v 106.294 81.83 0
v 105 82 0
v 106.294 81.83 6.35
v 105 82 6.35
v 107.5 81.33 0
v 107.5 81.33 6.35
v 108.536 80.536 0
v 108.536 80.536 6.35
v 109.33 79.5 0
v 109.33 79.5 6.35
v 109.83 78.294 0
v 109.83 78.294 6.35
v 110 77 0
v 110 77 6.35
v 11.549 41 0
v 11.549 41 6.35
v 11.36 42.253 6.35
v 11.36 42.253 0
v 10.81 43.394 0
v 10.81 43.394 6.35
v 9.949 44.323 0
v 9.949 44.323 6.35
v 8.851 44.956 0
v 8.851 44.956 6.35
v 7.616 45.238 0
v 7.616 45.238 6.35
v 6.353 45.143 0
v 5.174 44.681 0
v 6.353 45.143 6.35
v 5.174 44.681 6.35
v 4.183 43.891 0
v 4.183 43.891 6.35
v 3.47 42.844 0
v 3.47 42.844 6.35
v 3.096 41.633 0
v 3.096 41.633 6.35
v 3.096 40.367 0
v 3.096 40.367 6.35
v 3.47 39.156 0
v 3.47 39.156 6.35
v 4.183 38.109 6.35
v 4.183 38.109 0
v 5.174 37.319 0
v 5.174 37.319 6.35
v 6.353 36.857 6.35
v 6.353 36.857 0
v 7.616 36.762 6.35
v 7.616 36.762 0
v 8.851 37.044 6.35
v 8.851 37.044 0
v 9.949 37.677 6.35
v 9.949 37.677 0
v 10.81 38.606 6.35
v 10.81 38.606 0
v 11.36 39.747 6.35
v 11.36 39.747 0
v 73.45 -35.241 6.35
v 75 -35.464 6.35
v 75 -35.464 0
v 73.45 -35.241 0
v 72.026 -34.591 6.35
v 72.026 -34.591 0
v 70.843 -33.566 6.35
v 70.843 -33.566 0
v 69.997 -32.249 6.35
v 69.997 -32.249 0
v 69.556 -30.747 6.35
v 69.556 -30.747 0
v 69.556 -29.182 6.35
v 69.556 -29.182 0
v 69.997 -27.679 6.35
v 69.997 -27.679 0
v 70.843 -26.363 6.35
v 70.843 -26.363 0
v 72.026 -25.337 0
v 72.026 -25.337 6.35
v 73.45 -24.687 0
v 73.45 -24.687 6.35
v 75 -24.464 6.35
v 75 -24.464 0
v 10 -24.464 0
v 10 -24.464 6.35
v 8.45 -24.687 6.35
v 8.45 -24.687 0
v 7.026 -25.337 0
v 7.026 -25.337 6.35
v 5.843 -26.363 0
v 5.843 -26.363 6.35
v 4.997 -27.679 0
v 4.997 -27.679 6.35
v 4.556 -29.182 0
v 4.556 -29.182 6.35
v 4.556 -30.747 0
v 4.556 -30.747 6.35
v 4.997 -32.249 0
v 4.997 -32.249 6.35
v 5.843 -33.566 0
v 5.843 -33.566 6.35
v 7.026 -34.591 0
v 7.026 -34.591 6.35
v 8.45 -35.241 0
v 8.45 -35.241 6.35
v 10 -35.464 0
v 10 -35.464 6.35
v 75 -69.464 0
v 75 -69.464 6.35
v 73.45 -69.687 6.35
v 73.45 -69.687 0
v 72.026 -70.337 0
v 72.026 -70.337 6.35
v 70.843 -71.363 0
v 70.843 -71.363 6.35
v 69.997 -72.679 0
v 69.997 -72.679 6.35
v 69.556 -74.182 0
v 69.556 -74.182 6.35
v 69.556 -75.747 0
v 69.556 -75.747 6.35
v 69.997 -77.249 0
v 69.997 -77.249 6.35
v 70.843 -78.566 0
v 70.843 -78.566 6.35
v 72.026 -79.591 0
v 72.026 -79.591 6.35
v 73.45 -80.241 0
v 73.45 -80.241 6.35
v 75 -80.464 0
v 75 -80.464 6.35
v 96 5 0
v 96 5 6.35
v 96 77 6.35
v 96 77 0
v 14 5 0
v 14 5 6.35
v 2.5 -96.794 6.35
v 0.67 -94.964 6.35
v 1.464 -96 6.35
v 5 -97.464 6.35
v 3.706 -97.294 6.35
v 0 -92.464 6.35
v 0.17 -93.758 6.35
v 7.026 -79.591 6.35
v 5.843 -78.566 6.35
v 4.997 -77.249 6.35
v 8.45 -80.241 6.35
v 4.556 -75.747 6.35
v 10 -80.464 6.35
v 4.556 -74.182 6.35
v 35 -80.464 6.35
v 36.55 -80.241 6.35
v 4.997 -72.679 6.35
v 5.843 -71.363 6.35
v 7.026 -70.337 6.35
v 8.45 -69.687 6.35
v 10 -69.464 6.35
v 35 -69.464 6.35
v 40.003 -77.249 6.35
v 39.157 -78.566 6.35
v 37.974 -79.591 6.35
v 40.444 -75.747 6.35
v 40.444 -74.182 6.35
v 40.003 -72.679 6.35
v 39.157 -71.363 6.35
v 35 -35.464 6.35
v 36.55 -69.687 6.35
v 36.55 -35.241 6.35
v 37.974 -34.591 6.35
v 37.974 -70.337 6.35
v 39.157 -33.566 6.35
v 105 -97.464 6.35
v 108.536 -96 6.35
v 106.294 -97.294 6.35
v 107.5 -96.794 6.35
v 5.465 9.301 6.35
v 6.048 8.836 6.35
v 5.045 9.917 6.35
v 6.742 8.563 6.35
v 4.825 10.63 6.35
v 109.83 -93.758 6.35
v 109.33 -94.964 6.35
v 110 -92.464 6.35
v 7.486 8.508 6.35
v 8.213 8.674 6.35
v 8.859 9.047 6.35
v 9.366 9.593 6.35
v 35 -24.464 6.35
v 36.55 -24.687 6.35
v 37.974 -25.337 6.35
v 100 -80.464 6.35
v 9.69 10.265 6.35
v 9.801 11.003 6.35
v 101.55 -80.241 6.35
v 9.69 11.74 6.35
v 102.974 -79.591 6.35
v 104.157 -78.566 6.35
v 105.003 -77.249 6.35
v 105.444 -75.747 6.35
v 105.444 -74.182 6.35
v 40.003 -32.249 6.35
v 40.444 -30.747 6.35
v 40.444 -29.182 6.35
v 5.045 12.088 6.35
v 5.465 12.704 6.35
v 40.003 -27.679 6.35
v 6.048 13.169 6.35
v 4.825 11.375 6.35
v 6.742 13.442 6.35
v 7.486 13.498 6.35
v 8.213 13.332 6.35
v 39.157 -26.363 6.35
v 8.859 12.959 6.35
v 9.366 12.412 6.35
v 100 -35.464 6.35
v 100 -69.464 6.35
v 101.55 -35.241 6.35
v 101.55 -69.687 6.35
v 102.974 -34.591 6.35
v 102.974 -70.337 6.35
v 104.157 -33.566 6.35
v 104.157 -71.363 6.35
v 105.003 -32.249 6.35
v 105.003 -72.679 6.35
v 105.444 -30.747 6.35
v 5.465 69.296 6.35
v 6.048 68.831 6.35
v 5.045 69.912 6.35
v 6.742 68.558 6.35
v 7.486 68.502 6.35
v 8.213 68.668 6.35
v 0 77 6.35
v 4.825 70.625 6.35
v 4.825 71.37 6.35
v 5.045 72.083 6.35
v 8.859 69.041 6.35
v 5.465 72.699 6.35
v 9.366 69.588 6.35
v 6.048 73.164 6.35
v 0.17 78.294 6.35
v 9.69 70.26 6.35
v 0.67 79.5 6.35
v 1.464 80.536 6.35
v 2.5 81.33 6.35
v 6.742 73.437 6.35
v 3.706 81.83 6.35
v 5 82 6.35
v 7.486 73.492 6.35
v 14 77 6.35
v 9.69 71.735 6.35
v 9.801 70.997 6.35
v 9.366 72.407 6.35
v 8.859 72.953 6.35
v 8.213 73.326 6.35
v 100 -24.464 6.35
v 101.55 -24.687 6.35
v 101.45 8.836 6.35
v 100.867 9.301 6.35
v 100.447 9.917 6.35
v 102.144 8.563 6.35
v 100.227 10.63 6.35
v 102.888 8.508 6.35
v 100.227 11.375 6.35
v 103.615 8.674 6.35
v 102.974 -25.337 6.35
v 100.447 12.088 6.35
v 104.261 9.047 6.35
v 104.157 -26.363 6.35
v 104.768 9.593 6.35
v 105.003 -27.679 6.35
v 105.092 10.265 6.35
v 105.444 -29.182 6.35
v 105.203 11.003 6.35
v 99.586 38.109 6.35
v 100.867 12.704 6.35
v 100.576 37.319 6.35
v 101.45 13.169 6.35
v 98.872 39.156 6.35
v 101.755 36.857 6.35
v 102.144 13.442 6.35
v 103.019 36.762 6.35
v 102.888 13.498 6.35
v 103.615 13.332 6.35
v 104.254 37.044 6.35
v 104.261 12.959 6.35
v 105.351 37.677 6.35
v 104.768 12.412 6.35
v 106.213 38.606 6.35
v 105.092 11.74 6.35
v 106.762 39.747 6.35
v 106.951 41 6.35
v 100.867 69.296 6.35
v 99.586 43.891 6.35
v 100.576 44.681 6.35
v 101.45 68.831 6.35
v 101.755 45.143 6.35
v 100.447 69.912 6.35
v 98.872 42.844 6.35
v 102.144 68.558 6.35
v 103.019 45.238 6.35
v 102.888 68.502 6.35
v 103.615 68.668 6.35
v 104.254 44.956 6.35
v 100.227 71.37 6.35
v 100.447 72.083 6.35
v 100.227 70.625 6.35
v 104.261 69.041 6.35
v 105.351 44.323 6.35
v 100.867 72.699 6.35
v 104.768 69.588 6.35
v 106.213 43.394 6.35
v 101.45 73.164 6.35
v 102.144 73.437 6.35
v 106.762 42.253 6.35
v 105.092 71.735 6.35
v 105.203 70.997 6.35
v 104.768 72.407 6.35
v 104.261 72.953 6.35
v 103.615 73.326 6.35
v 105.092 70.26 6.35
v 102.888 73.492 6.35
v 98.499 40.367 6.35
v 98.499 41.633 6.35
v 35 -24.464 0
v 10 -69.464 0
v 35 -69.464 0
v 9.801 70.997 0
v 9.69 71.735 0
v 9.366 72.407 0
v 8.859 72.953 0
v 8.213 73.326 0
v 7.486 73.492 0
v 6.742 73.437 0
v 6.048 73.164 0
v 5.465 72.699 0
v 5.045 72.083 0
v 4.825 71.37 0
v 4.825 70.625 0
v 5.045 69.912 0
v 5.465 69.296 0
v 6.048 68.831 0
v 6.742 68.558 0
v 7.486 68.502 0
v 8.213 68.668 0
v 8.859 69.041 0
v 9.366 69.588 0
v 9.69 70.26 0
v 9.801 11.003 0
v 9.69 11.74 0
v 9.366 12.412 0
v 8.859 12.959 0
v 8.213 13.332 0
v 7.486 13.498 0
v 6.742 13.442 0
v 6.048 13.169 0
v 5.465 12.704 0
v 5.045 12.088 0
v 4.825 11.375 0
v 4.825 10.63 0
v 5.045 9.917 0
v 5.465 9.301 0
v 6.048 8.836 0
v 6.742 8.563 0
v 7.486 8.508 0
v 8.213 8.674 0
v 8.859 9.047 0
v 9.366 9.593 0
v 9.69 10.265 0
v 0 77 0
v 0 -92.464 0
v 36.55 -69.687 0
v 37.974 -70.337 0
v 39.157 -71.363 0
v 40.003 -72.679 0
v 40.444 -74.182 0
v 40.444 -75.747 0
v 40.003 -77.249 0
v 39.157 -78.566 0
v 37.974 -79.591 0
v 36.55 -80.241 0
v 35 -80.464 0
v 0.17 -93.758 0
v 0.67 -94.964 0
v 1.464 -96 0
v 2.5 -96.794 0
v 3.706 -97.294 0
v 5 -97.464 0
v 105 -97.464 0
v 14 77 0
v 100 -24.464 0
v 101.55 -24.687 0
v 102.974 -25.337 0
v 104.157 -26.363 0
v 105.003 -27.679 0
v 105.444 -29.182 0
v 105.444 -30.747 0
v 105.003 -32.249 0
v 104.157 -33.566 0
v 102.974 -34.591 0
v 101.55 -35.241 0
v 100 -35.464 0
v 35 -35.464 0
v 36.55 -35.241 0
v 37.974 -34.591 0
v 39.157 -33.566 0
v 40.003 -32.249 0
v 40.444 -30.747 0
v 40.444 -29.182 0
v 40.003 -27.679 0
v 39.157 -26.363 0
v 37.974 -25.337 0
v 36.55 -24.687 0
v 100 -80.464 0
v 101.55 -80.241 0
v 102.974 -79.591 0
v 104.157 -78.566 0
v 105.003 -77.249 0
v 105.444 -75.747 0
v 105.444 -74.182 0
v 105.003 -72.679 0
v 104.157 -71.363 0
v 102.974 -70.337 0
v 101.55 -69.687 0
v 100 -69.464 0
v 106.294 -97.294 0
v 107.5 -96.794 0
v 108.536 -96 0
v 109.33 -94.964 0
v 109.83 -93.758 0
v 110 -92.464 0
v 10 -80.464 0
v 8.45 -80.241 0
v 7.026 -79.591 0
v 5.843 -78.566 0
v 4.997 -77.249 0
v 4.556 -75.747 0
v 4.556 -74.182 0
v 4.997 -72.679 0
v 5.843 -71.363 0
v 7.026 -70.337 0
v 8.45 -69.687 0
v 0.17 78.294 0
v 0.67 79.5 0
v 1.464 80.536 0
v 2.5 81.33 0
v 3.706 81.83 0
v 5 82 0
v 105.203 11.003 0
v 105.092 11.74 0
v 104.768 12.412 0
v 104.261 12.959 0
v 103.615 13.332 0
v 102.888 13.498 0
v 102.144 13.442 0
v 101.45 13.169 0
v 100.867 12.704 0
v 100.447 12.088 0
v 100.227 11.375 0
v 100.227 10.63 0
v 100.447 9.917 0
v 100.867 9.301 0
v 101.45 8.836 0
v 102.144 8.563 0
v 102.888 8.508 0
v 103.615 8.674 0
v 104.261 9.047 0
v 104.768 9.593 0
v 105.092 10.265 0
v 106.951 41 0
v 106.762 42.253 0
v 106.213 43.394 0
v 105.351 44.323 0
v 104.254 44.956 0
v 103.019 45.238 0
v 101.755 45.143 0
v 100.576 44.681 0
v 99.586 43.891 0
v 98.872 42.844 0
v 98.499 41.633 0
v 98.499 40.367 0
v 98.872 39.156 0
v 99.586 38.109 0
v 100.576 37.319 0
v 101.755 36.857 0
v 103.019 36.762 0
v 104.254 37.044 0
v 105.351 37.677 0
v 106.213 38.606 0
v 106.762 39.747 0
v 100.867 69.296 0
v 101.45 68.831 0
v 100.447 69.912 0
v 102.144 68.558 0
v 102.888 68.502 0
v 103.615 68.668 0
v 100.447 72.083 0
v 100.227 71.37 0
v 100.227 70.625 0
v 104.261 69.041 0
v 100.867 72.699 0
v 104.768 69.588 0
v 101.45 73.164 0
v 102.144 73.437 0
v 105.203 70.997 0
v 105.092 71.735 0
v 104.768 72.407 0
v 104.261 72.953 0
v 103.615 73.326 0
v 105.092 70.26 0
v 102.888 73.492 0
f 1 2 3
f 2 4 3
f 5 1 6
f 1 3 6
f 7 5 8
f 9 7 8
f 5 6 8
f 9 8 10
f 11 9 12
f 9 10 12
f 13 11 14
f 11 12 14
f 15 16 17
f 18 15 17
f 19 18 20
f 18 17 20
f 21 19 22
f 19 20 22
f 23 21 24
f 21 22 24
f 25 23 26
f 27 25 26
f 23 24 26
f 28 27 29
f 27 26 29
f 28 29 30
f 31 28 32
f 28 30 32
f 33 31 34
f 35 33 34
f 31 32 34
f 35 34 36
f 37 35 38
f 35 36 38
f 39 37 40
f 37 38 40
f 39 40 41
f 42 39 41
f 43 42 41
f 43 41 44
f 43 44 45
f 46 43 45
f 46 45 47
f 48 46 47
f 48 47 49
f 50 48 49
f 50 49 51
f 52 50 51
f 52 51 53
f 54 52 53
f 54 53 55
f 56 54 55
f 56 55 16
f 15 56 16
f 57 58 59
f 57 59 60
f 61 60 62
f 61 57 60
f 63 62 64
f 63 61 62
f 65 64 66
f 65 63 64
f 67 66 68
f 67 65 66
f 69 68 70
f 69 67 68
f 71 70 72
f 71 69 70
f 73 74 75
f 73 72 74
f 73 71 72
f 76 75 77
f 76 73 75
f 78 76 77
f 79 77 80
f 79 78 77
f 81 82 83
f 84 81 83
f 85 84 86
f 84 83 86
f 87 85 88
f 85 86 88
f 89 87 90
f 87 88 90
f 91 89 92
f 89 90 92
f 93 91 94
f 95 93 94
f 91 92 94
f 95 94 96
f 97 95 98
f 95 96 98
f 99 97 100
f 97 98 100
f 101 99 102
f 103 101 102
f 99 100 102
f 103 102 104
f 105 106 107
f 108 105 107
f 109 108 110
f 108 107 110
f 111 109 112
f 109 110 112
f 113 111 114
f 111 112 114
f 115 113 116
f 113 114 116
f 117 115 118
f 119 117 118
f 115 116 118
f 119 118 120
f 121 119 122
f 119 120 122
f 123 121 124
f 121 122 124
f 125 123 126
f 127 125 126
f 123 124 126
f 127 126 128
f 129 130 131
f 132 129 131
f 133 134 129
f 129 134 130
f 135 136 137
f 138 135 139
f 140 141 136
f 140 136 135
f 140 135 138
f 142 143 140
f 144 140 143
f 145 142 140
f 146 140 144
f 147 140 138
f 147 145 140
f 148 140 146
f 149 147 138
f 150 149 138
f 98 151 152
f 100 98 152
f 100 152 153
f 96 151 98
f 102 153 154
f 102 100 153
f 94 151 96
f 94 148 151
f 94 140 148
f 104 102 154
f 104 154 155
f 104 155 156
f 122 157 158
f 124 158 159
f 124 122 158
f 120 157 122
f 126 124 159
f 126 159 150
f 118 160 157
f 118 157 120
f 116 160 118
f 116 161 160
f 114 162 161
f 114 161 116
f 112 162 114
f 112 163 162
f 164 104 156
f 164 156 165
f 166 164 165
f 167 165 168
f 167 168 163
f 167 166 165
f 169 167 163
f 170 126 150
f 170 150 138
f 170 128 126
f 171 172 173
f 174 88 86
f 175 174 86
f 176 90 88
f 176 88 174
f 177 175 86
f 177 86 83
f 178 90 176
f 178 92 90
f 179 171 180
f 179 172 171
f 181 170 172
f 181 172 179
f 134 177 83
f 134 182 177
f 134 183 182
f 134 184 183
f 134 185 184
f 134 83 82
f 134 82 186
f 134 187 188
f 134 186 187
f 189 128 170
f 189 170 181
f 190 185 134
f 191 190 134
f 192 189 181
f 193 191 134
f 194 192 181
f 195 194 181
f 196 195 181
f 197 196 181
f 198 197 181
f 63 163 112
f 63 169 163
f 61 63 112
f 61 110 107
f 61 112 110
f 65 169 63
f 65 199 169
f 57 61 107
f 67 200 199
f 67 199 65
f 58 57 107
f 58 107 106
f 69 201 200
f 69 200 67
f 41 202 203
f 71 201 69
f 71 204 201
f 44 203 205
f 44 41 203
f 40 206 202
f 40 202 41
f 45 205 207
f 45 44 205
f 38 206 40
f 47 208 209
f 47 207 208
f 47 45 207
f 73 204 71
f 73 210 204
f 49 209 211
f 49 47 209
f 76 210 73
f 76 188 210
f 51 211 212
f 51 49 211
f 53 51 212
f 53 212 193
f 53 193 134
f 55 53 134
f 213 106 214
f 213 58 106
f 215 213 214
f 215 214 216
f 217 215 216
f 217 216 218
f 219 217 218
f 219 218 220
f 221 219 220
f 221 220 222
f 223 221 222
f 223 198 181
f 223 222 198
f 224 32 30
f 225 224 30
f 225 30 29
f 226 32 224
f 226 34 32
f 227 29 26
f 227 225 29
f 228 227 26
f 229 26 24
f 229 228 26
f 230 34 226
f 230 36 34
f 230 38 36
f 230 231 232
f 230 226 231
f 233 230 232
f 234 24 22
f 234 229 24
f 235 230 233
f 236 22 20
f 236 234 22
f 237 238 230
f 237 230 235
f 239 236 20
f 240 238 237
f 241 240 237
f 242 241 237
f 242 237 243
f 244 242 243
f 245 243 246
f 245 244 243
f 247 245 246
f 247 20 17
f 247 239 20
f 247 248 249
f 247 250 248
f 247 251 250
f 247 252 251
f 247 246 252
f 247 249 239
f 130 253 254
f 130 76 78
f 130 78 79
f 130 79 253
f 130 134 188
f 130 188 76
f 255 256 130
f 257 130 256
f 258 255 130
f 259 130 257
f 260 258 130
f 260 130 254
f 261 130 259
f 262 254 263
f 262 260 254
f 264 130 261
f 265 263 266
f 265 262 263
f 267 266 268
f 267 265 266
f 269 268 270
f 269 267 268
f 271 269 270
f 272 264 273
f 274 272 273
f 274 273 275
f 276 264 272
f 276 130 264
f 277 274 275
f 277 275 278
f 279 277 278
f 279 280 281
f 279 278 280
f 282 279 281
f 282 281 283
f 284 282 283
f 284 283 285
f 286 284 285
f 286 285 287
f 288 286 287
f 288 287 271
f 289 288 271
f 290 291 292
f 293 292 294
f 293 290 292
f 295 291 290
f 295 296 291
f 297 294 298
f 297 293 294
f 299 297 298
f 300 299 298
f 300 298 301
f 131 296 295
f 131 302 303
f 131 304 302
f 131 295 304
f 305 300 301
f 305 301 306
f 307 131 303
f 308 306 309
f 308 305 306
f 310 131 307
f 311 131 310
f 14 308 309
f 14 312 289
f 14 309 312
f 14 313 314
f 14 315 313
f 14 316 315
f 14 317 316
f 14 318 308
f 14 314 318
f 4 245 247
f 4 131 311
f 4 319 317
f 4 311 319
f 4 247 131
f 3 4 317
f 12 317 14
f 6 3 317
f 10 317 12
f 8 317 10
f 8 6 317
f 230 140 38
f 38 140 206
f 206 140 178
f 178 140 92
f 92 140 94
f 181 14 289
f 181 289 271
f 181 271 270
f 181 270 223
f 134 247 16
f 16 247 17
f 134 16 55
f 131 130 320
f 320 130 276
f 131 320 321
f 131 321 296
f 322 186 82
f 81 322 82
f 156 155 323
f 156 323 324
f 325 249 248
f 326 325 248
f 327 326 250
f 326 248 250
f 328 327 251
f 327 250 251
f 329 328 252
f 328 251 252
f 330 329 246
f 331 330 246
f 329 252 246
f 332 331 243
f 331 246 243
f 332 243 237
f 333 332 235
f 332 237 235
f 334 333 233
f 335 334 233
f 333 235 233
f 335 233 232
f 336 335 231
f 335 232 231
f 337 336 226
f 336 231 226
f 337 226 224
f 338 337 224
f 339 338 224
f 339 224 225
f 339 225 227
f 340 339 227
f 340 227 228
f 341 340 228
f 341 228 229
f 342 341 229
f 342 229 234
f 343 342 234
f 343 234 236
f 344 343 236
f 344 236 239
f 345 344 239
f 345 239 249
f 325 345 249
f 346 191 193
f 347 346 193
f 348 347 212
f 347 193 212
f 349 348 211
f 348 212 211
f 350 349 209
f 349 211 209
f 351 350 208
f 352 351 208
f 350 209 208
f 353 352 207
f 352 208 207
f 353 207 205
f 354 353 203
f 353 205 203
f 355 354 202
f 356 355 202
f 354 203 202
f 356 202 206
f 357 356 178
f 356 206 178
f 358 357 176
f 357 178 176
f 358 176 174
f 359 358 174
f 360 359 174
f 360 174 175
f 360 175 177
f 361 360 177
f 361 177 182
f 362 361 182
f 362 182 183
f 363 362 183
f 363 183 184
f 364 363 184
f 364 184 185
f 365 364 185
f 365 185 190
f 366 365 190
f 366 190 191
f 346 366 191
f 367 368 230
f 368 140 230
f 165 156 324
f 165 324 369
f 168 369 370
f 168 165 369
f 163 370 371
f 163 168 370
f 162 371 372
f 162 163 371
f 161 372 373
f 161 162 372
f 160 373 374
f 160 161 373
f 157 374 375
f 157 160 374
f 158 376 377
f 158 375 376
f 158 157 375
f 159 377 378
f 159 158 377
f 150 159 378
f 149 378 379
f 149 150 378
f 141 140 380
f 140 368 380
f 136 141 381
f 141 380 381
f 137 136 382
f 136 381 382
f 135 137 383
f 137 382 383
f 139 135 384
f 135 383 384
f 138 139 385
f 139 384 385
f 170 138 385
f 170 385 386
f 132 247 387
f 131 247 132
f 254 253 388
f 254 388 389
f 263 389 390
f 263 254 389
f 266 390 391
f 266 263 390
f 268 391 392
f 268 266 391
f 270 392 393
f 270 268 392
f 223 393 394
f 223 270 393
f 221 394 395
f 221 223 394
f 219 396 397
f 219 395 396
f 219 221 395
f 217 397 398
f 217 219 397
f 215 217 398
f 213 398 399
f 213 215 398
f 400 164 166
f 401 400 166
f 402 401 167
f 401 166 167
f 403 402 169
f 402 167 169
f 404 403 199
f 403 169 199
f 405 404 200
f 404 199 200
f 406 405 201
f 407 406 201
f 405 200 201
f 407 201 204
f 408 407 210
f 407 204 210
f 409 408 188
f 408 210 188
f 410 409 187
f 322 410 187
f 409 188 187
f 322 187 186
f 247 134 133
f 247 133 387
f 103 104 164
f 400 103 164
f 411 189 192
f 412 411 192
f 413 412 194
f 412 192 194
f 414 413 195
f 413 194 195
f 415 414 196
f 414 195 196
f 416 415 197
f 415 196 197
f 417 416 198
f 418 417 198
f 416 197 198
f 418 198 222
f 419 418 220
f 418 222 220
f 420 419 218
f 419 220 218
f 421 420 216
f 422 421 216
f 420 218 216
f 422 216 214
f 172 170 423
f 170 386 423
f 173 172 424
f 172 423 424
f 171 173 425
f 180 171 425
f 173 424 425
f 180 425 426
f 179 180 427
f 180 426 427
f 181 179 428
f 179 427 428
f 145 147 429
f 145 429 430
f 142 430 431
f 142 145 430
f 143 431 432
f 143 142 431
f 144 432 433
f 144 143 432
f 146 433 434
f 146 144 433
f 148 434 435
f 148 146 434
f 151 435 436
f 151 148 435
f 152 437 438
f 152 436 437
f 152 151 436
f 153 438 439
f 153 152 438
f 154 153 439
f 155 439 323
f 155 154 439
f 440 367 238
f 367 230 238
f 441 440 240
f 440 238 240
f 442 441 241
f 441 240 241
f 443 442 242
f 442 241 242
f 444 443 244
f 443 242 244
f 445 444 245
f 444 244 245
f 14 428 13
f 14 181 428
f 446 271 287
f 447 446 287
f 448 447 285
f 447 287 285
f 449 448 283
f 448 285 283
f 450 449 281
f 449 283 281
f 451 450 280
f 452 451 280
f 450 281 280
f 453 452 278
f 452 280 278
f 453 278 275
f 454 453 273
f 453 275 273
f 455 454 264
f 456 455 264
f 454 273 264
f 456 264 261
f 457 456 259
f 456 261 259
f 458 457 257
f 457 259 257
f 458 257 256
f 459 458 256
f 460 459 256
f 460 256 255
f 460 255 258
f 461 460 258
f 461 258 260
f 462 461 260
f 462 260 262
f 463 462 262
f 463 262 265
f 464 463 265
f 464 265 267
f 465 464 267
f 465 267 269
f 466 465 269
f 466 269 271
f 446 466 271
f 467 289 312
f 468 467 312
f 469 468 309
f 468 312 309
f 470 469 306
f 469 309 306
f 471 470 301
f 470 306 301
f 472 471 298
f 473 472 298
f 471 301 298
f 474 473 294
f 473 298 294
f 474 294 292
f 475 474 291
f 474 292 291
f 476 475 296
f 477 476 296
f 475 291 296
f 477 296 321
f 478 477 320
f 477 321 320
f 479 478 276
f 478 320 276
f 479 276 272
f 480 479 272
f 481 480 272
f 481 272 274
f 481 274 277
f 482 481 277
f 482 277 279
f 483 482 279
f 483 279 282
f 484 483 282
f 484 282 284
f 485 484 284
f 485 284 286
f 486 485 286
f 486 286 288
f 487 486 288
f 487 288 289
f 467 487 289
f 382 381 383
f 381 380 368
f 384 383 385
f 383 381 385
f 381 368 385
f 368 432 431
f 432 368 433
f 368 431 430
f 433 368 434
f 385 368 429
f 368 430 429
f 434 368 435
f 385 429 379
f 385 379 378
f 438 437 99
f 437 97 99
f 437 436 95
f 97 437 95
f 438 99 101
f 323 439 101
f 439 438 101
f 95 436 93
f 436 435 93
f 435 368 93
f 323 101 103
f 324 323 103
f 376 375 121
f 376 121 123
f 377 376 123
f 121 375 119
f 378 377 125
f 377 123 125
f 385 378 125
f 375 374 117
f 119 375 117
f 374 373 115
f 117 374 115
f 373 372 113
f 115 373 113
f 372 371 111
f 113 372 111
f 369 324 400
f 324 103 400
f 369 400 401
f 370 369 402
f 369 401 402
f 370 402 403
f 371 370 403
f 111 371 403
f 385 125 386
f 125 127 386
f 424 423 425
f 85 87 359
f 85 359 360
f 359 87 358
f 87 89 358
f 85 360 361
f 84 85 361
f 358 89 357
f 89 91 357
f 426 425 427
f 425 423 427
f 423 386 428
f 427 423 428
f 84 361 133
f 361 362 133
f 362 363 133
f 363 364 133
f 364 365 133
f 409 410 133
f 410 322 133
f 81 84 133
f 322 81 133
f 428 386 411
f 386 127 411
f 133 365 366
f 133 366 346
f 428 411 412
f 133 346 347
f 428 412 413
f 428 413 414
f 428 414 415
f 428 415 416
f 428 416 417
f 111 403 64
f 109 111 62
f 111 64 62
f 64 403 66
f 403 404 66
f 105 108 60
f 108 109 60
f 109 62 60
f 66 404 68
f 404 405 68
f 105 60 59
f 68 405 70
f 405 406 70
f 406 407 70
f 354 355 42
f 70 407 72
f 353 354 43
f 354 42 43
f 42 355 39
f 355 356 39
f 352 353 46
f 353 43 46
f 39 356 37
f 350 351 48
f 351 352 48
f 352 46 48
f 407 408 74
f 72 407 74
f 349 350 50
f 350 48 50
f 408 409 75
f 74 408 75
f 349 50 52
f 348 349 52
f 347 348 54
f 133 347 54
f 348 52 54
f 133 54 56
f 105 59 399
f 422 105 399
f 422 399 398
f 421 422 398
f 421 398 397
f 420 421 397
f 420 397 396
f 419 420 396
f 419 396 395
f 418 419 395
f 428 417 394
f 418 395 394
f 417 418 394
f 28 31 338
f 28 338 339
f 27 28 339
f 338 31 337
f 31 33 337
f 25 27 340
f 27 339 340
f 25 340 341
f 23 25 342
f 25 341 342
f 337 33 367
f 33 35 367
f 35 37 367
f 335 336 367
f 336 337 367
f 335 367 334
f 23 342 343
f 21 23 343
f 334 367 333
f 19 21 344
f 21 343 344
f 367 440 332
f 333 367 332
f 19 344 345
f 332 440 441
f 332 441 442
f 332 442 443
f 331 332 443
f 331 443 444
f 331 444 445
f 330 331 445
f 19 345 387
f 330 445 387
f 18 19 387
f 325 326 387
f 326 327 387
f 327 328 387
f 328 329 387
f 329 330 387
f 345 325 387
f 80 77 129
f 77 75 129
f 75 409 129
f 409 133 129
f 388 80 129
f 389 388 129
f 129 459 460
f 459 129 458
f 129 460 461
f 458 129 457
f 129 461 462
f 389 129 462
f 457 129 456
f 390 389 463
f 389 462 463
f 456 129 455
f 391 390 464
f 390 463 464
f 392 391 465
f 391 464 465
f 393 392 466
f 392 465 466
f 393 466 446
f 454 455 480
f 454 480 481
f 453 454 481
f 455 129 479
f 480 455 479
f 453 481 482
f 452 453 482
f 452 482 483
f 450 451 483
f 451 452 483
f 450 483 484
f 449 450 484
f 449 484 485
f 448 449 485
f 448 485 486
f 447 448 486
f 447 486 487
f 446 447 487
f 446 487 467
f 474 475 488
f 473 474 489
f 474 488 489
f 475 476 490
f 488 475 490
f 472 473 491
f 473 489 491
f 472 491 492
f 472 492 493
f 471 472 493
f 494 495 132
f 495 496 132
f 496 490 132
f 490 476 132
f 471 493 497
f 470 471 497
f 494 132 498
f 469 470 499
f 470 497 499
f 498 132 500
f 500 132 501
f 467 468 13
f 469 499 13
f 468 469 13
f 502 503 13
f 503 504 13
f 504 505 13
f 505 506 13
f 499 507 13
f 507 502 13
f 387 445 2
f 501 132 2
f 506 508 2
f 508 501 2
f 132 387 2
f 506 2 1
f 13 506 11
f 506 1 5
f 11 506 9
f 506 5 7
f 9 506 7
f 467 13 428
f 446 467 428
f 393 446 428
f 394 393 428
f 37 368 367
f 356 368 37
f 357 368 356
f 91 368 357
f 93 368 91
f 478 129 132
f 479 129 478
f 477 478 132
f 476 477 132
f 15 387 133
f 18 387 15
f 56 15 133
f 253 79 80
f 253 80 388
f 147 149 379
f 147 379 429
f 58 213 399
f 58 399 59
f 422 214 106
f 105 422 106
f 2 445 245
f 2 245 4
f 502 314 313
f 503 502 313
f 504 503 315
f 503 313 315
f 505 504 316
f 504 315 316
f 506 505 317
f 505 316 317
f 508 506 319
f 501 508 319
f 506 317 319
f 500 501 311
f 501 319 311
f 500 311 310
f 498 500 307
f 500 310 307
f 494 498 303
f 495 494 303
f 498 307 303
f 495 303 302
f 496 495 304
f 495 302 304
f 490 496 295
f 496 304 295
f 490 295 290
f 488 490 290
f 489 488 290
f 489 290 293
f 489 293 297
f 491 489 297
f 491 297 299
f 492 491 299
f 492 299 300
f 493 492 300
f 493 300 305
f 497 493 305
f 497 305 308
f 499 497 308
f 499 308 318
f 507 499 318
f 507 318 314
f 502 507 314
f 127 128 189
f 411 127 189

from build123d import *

# Parameters (mm, degrees)
SKETCH1_W           = 110
SKETCH1_H           = 82
BOSS_EXTRUDE1_DEPTH = 6.35
CUT_EXTRUDE1_REACH  = 8.35
SKETCH2_W           = 82
SKETCH2_H           = 72
SKETCH3_W           = 110
SKETCH3_H           = 97.464272111
BOSS_EXTRUDE2_DEPTH = 6.35
CUT_EXTRUDE2_REACH  = 8.35
FILLET1_R           = 5
CUT_EXTRUDE3_REACH  = 8.35
SKETCH5_R           = 2.5019
SKETCH5_R_2         = 4.25


with BuildPart() as part:
    # Sketch1 → Boss-Extrude1 (new body)
    with BuildSketch(Plane.XY):
        with Locations((55, 41)):
            Rectangle(SKETCH1_W, SKETCH1_H)
    extrude(amount=BOSS_EXTRUDE1_DEPTH)

    # Sketch2 → Cut-Extrude1 (cut, up to next)
    with BuildSketch(Plane.XY.offset(6.35), mode=Mode.PRIVATE) as cut_extrude1_sk1:
        with Locations((55, 41)):
            Rectangle(SKETCH2_W, SKETCH2_H)
    cut_extrude1_tool1 = extrude(cut_extrude1_sk1.sketch, amount=-CUT_EXTRUDE1_REACH, mode=Mode.PRIVATE) & part.part
    add(cut_extrude1_tool1.solids().sort_by_distance((55, 41, 6.35))[0], mode=Mode.SUBTRACT)

    # Sketch3 → Boss-Extrude2 (add)
    with BuildSketch(Plane.XY.offset(6.35)):
        with Locations((55, -48.732136055)):
            Rectangle(SKETCH3_W, SKETCH3_H)
    extrude(amount=-BOSS_EXTRUDE2_DEPTH)

    # Sketch4 → Cut-Extrude2 (cut, up to next)
    with BuildSketch(Plane.XY.offset(6.35), mode=Mode.PRIVATE) as cut_extrude2_sk1:
        with BuildLine():
            Line((10, -69.464272111), (35, -69.464272111))
            ThreePointArc((35, -69.464272111), (40.5, -74.964272111), (35, -80.464272111))
            Line((35, -80.464272111), (10, -80.464272111))
            ThreePointArc((10, -80.464272111), (4.5, -74.964272111), (10, -69.464272111))
        make_face()
    cut_extrude2_tool1 = extrude(cut_extrude2_sk1.sketch, amount=-CUT_EXTRUDE2_REACH, mode=Mode.PRIVATE) & part.part
    add(cut_extrude2_tool1.solids().sort_by_distance((22.5, -74.964272, 6.35))[0], mode=Mode.SUBTRACT)
    # Sketch4 → Cut-Extrude2 (cut, up to next)
    with BuildSketch(Plane.XY.offset(6.35), mode=Mode.PRIVATE) as cut_extrude2_sk2:
        with BuildLine():
            Line((100, -69.464272111), (75, -69.464272111))
            ThreePointArc((75, -69.464272111), (69.5, -74.964272111), (75, -80.464272111))
            Line((75, -80.464272111), (100, -80.464272111))
            ThreePointArc((100, -80.464272111), (105.5, -74.964272111), (100, -69.464272111))
        make_face()
    cut_extrude2_tool2 = extrude(cut_extrude2_sk2.sketch, amount=-CUT_EXTRUDE2_REACH, mode=Mode.PRIVATE) & part.part
    add(cut_extrude2_tool2.solids().sort_by_distance((87.5, -74.964272, 6.35))[0], mode=Mode.SUBTRACT)
    # Sketch4 → Cut-Extrude2 (cut, up to next)
    with BuildSketch(Plane.XY.offset(6.35), mode=Mode.PRIVATE) as cut_extrude2_sk3:
        with BuildLine():
            Line((10, -35.464272111), (35, -35.464272111))
            ThreePointArc((35, -35.464272111), (40.5, -29.964272111), (35, -24.464272111))
            Line((35, -24.464272111), (10, -24.464272111))
            ThreePointArc((10, -24.464272111), (4.5, -29.964272111), (10, -35.464272111))
        make_face()
    cut_extrude2_tool3 = extrude(cut_extrude2_sk3.sketch, amount=-CUT_EXTRUDE2_REACH, mode=Mode.PRIVATE) & part.part
    add(cut_extrude2_tool3.solids().sort_by_distance((22.5, -29.964272, 6.35))[0], mode=Mode.SUBTRACT)
    # Sketch4 → Cut-Extrude2 (cut, up to next)
    with BuildSketch(Plane.XY.offset(6.35), mode=Mode.PRIVATE) as cut_extrude2_sk4:
        with BuildLine():
            Line((100, -35.464272111), (75, -35.464272111))
            ThreePointArc((75, -35.464272111), (69.5, -29.964272111), (75, -24.464272111))
            Line((75, -24.464272111), (100, -24.464272111))
            ThreePointArc((100, -24.464272111), (105.5, -29.964272111), (100, -35.464272111))
        make_face()
    cut_extrude2_tool4 = extrude(cut_extrude2_sk4.sketch, amount=-CUT_EXTRUDE2_REACH, mode=Mode.PRIVATE) & part.part
    add(cut_extrude2_tool4.solids().sort_by_distance((87.5, -29.964272, 6.35))[0], mode=Mode.SUBTRACT)

    # Fillet1
    fillet1_edges = [part.edges().sort_by_distance(p)[0] for p in [
        (110, -97.464272111, 3.175),
        (0, -97.464272111, 3.175),
        (0, 82, 3.175),
        (110, 82, 3.175),
    ]]
    fillet(fillet1_edges, radius=FILLET1_R)

    # Sketch5 → Cut-Extrude3 (cut, up to next)
    with BuildSketch(Plane.XY.offset(6.35), mode=Mode.PRIVATE) as cut_extrude3_sk1:
        with Locations((7.2988, 11.0026)):
            Circle(SKETCH5_R)
    cut_extrude3_tool1 = extrude(cut_extrude3_sk1.sketch, amount=-CUT_EXTRUDE3_REACH, mode=Mode.PRIVATE) & part.part
    add(cut_extrude3_tool1.solids().sort_by_distance((7.2988, 11.0026, 6.35))[0], mode=Mode.SUBTRACT)
    # Sketch5 → Cut-Extrude3 (cut, up to next)
    with BuildSketch(Plane.XY.offset(6.35), mode=Mode.PRIVATE) as cut_extrude3_sk2:
        with Locations((7.2988, 70.9974)):
            Circle(SKETCH5_R)
    cut_extrude3_tool2 = extrude(cut_extrude3_sk2.sketch, amount=-CUT_EXTRUDE3_REACH, mode=Mode.PRIVATE) & part.part
    add(cut_extrude3_tool2.solids().sort_by_distance((7.2988, 70.9974, 6.35))[0], mode=Mode.SUBTRACT)
    # Sketch5 → Cut-Extrude3 (cut, up to next)
    with BuildSketch(Plane.XY.offset(6.35), mode=Mode.PRIVATE) as cut_extrude3_sk3:
        with Locations((102.7012, 70.9974)):
            Circle(SKETCH5_R)
    cut_extrude3_tool3 = extrude(cut_extrude3_sk3.sketch, amount=-CUT_EXTRUDE3_REACH, mode=Mode.PRIVATE) & part.part
    add(cut_extrude3_tool3.solids().sort_by_distance((102.7012, 70.9974, 6.35))[0], mode=Mode.SUBTRACT)
    # Sketch5 → Cut-Extrude3 (cut, up to next)
    with BuildSketch(Plane.XY.offset(6.35), mode=Mode.PRIVATE) as cut_extrude3_sk4:
        with Locations((102.7012, 11.0026)):
            Circle(SKETCH5_R)
    cut_extrude3_tool4 = extrude(cut_extrude3_sk4.sketch, amount=-CUT_EXTRUDE3_REACH, mode=Mode.PRIVATE) & part.part
    add(cut_extrude3_tool4.solids().sort_by_distance((102.7012, 11.0026, 6.35))[0], mode=Mode.SUBTRACT)
    # Sketch5 → Cut-Extrude3 (cut, up to next)
    with BuildSketch(Plane.XY.offset(6.35), mode=Mode.PRIVATE) as cut_extrude3_sk5:
        with Locations((7.2988, 41)):
            Circle(SKETCH5_R_2)
    cut_extrude3_tool5 = extrude(cut_extrude3_sk5.sketch, amount=-CUT_EXTRUDE3_REACH, mode=Mode.PRIVATE) & part.part
    add(cut_extrude3_tool5.solids().sort_by_distance((7.2988, 41, 6.35))[0], mode=Mode.SUBTRACT)
    # Sketch5 → Cut-Extrude3 (cut, up to next)
    with BuildSketch(Plane.XY.offset(6.35), mode=Mode.PRIVATE) as cut_extrude3_sk6:
        with Locations((102.7012, 41)):
            Circle(SKETCH5_R_2)
    cut_extrude3_tool6 = extrude(cut_extrude3_sk6.sketch, amount=-CUT_EXTRUDE3_REACH, mode=Mode.PRIVATE) & part.part
    add(cut_extrude3_tool6.solids().sort_by_distance((102.7012, 41, 6.35))[0], mode=Mode.SUBTRACT)


solid = part.part
